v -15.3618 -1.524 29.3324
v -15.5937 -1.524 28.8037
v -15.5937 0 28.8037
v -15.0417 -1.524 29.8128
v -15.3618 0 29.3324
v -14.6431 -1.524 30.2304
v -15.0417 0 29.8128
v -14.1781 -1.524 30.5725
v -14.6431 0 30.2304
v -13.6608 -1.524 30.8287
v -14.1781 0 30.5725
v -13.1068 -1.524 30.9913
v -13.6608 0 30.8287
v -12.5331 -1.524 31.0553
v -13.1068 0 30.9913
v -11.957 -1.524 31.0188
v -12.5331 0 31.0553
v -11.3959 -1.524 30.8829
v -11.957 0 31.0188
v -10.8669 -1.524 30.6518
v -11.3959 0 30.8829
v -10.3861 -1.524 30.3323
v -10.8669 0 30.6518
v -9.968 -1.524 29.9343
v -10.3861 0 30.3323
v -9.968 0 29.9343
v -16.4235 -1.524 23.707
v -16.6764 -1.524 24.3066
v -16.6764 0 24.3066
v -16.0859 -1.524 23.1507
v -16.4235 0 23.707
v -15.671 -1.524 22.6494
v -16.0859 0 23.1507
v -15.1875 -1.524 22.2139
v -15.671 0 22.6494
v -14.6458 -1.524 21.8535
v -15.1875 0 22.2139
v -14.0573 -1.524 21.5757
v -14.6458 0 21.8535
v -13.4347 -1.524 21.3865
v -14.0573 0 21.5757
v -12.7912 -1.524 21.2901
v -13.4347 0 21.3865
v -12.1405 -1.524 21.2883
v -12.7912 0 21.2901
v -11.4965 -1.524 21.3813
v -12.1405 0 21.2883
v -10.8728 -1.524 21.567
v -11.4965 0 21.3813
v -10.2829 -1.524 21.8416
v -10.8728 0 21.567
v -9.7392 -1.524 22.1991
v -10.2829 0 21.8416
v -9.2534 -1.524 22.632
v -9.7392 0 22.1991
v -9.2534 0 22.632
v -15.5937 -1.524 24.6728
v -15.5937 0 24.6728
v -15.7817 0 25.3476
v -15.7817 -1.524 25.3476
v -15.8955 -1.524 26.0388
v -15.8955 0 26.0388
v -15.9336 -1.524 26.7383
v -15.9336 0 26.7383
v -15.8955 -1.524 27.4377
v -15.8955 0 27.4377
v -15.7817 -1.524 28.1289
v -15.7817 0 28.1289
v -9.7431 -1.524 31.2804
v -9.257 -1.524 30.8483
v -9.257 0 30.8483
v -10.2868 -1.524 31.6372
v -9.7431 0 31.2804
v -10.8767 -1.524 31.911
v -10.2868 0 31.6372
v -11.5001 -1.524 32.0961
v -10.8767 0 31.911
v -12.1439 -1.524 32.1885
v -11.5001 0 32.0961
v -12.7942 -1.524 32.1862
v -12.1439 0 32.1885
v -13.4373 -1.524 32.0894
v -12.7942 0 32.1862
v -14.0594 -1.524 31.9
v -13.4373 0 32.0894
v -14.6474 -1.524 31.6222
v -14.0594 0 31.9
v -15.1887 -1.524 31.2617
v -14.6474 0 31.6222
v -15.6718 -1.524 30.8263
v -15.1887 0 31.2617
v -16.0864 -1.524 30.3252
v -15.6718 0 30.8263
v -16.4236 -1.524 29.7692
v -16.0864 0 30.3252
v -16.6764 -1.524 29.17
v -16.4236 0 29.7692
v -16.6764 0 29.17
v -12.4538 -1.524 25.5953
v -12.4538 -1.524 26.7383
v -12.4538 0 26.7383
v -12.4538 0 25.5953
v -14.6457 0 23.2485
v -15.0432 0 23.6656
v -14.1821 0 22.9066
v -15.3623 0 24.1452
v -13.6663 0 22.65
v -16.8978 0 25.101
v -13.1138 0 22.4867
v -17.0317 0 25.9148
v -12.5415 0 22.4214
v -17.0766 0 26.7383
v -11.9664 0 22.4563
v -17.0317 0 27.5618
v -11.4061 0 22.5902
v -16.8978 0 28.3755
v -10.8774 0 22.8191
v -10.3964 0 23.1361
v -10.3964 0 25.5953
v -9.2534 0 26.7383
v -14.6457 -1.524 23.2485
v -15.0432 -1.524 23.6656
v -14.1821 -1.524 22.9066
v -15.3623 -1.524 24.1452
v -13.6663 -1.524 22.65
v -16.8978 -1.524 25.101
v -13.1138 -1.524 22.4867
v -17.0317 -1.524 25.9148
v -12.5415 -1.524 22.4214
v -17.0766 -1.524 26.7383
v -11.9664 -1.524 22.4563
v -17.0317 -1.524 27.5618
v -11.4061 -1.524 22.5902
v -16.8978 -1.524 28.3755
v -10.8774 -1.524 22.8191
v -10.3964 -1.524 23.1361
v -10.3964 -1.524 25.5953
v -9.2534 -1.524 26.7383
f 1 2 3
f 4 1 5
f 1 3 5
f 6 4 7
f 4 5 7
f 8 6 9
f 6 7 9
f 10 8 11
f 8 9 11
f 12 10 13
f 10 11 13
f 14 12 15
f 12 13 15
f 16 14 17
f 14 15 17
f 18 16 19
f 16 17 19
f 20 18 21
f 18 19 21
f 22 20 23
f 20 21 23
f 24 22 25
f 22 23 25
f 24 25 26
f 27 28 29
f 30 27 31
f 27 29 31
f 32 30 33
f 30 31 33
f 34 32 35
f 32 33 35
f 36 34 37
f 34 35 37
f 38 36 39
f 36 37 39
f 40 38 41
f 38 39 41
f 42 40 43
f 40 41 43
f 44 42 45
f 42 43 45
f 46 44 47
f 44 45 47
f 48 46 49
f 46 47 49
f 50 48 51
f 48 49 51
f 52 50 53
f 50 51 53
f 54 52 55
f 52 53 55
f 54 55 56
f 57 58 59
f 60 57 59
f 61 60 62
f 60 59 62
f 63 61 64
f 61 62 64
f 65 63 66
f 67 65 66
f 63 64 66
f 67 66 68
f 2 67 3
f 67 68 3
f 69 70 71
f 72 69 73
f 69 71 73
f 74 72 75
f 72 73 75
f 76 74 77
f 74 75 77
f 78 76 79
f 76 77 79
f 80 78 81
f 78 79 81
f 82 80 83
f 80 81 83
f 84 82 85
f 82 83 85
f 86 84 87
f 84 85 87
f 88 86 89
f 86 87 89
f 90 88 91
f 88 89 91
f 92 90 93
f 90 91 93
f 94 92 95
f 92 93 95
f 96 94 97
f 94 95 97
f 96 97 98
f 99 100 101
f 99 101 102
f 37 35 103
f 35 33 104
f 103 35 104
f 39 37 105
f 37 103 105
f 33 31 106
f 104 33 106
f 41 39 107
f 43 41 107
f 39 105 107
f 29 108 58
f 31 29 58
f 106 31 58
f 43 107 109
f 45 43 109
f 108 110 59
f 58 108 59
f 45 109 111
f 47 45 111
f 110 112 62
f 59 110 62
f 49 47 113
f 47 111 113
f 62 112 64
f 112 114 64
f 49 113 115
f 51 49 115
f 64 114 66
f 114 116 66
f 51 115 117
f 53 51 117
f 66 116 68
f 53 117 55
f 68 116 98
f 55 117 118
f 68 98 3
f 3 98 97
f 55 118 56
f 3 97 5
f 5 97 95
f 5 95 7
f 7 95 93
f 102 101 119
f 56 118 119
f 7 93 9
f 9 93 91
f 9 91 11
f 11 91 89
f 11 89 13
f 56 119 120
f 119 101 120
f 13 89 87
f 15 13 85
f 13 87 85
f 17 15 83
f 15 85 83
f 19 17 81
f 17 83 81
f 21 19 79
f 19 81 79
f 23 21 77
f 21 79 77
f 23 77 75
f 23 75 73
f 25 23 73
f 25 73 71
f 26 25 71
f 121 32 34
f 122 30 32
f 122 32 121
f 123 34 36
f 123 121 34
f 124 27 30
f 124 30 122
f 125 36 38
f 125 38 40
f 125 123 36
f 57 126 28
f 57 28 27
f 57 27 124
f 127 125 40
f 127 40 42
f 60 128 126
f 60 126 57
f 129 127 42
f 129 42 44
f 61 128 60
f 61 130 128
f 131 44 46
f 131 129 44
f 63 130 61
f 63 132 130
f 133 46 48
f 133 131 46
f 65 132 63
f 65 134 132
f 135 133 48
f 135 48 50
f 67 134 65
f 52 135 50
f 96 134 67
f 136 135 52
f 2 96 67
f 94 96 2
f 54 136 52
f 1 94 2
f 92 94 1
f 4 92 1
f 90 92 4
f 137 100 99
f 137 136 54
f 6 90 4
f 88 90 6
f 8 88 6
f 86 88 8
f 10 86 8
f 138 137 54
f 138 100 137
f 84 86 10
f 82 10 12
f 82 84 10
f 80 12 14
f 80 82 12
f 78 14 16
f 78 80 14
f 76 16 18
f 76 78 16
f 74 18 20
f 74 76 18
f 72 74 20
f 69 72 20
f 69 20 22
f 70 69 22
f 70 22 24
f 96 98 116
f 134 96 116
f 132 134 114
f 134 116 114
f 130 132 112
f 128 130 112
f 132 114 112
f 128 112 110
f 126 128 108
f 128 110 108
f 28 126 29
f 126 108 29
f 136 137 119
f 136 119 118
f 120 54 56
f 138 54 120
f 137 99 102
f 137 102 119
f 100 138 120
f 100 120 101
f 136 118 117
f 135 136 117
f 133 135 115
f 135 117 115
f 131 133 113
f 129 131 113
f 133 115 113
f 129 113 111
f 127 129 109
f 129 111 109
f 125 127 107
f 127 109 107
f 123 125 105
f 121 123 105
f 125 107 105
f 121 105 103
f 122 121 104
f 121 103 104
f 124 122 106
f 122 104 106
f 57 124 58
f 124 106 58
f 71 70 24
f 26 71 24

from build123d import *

# Parameters (mm, degrees)
F1_DEPTH = 1.524
F3_DEPTH = 1.524
F4_DEPTH = 25.4


with BuildPart() as f1:
    # F0 (on Front) → F1 (new body)
    with BuildSketch(Plane.XZ):
        with BuildLine():
            ThreePointArc((-16.676399, 24.306558), (-12.453754, 21.27727), (-8.231109, 24.306558))
            ThreePointArc((-8.231109, 24.306558), (-7.830954, 26.73827), (-8.231109, 29.169981))
            ThreePointArc((-8.231109, 29.169981), (-12.453754, 32.19927), (-16.676399, 29.169981))
            ThreePointArc((-16.676399, 29.169981), (-17.076554, 26.73827), (-16.676399, 24.306558))
        make_face()
        with BuildLine():
            ThreePointArc((-15.593669, 28.803722), (-12.453754, 31.05627), (-9.313838, 28.803722))
            ThreePointArc((-9.313838, 28.803722), (-8.973954, 26.73827), (-9.313838, 24.672818))
            ThreePointArc((-9.313838, 24.672818), (-12.453754, 22.42027), (-15.593669, 24.672818))
            ThreePointArc((-15.593669, 24.672818), (-15.933554, 26.73827), (-15.593669, 28.803722))
        make_face(mode=Mode.SUBTRACT)
    extrude(amount=F1_DEPTH)

    # F2 (on face) → F3 (join)
    with BuildSketch(Plane.XZ.offset(1.524)):
        with BuildLine():
            ThreePointArc((-9.313838, 24.672818), (-9.282874, 24.76672), (-9.253354, 24.861087))
            Line((-9.253354, 24.861087), (-9.253354, 26.73827))
            Line((-9.253354, 26.73827), (-12.453754, 26.73827))
            Line((-12.453754, 26.73827), (-12.453754, 25.59527))
            Line((-12.453754, 25.59527), (-10.396354, 25.59527))
            Line((-10.396354, 25.59527), (-10.396354, 23.136058))
            ThreePointArc((-10.396354, 23.136058), (-9.743877, 23.826094), (-9.313838, 24.672818))
        make_face()
    extrude(amount=-F3_DEPTH)

    # F2 (on face) → F4 (cut)
    with BuildSketch(Plane.XZ.offset(1.524)):
        with BuildLine():
            Line((-9.253354, 24.861087), (-9.253354, 22.631983))
            ThreePointArc((-9.253354, 22.631983), (-8.64896, 23.412333), (-8.231109, 24.306558))
            ThreePointArc((-8.231109, 24.306558), (-7.830954, 26.73827), (-8.231109, 29.169981))
            ThreePointArc((-8.231109, 29.169981), (-8.650336, 30.066457), (-9.257028, 30.848342))
            Line((-9.257028, 30.848342), (-9.967955, 29.934294))
            ThreePointArc((-9.967955, 29.934294), (-9.584657, 29.401546), (-9.313838, 28.803722))
            ThreePointArc((-9.313838, 28.803722), (-8.974712, 26.837143), (-9.253354, 24.861087))
        make_face()
    extrude(amount=-F4_DEPTH, mode=Mode.SUBTRACT)


solid = f1.part
